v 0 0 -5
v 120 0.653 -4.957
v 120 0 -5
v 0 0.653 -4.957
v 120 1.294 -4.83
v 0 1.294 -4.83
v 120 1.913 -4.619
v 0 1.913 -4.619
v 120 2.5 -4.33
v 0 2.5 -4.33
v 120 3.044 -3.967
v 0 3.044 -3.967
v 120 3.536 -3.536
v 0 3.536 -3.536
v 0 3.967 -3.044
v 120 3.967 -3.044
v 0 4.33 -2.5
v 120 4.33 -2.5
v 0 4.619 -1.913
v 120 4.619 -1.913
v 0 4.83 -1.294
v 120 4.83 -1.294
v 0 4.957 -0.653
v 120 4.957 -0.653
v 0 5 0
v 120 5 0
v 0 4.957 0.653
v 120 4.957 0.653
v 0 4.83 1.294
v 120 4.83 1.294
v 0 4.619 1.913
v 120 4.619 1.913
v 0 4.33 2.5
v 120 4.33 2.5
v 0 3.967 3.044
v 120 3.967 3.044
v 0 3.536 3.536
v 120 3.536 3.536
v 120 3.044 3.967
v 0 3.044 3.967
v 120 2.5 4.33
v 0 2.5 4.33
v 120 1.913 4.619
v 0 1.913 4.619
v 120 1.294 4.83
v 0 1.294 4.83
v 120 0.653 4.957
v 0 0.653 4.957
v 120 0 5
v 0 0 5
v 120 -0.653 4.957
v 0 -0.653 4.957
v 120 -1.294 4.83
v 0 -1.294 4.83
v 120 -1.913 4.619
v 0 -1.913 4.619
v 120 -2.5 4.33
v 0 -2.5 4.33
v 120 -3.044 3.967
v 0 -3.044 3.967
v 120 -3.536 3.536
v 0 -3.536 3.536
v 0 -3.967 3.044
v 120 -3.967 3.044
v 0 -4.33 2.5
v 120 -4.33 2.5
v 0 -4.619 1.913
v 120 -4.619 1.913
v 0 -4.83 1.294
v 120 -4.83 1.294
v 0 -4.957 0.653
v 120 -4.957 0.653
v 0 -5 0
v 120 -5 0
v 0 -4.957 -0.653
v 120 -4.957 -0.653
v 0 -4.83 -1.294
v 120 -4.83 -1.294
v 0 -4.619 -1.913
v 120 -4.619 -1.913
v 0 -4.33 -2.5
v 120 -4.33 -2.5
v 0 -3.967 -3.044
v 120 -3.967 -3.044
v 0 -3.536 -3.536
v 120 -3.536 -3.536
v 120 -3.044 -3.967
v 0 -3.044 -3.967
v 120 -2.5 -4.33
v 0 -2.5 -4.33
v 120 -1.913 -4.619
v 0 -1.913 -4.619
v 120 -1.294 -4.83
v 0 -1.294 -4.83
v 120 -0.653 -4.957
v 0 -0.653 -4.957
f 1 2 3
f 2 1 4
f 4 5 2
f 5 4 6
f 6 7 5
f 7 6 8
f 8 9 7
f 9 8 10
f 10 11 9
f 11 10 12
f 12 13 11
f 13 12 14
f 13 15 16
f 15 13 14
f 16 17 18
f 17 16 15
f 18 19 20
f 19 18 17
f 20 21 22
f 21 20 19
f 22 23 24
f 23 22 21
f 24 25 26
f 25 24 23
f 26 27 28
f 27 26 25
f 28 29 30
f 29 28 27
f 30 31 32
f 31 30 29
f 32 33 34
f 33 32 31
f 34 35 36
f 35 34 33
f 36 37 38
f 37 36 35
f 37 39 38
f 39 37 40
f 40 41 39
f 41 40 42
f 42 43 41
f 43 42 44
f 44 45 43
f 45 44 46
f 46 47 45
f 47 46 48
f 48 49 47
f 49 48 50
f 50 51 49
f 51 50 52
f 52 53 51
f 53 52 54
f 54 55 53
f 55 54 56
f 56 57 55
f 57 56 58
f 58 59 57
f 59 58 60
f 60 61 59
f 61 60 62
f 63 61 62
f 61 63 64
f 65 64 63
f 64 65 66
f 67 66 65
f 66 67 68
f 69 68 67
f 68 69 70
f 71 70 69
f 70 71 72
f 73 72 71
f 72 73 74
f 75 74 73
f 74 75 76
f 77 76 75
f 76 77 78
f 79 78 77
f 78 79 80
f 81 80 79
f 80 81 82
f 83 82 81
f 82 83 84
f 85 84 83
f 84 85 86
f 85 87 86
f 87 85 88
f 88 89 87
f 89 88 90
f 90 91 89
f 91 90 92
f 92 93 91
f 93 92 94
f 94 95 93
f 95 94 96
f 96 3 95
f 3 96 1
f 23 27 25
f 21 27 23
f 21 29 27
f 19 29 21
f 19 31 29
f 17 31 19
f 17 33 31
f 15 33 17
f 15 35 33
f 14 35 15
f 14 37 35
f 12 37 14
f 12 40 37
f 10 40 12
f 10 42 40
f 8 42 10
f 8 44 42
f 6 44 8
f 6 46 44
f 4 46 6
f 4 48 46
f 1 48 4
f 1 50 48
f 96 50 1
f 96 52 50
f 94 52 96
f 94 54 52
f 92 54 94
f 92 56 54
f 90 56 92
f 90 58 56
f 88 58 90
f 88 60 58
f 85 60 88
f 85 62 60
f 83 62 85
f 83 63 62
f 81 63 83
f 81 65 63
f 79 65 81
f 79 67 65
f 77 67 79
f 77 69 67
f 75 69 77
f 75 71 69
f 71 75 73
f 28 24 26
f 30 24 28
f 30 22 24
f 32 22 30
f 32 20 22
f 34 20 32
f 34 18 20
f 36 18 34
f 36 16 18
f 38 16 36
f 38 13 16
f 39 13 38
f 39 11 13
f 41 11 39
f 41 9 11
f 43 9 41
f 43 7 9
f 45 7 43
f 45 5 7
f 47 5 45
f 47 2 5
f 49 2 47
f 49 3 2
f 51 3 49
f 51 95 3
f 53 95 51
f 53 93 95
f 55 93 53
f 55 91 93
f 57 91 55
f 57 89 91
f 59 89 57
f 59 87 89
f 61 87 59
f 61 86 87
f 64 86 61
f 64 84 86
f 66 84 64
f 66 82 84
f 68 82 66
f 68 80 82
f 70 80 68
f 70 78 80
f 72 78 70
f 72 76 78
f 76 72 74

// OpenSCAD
// file: ../config/TF3D-SDC-01_dimensions.scad
// TriFusión 3D – Smart Dry Cabinet
// Modelo TF3D-SDC-01 | Sprint 3.2 | Rev A
// Unidades: mm

CABINET_W = 800;
CABINET_H = 1000;
CABINET_D = 500;
BOARD_T = 18;

INNER_W = CABINET_W - 2*BOARD_T;
INNER_H = CABINET_H - 2*BOARD_T;

BACK_W = INNER_W;
BACK_H = INNER_H;
BACK_T = BOARD_T;

// Compartimento técnico inferior
TECH_H = 160;
TECH_LID_Z = TECH_H;

// Puerta sobrepuesta
DOOR_GAP = 3;
DOOR_W = CABINET_W - 2*DOOR_GAP;
DOOR_H = CABINET_H - 2*DOOR_GAP;
DOOR_FRAME = 30;
DOOR_FRAME_D = 20;
ACRYLIC_T = 6;
EPDM_T = 4;

// Soportes de carrete
SPOOL_ROWS = 4;
SPOOLS_PER_ROW = 4;
SPOOL_CENTERS_X = [110, 300, 490, 680];
SPOOL_ROWS_Z = [270, 475, 680, 885];
SUPPORT_PAIR_GAP = 82; // separación entre soportes de una misma bobina
ROD_D = 10;
ROD_L = 120;

// Soporte impreso
SUPPORT_W = 28;
SUPPORT_H = 72;
SUPPORT_D = 92;
MOUNT_T = 8;
CRADLE_R = 7;

// Ventilador previsto
FAN_SIZE = 120;
FAN_HOLE_SPACING = 105;
FAN_HOLE_D = 4.5;

// Apariencia
MELAMINE = [0.94,0.94,0.94];
PRINTED = [0.08,0.25,0.75];
METAL = [0.12,0.12,0.12];
ACRYLIC = [0.55,0.82,1.0,0.25];
SEAL = [0.05,0.05,0.05];
// file: ../config/common.scad
include <TF3D-SDC-01_dimensions.scad>

module board(size=[100,100,18], c=MELAMINE) {
    color(c) cube(size, center=false);
}

module rod(length=ROD_L, diameter=ROD_D) {
    color([0.65,0.65,0.68])
        rotate([0,90,0])
            cylinder(h=length, d=diameter, $fn=48);
}

module rounded_box(size=[20,20,20], r=3) {
    minkowski() {
        cube([size[0]-2*r,size[1]-2*r,size[2]-2*r]);
        sphere(r=r,$fn=24);
    }
}
// main file
include <../config/common.scad>
// Pieza comercial: varilla lisa inoxidable Ø10 × 120 mm
rod();
